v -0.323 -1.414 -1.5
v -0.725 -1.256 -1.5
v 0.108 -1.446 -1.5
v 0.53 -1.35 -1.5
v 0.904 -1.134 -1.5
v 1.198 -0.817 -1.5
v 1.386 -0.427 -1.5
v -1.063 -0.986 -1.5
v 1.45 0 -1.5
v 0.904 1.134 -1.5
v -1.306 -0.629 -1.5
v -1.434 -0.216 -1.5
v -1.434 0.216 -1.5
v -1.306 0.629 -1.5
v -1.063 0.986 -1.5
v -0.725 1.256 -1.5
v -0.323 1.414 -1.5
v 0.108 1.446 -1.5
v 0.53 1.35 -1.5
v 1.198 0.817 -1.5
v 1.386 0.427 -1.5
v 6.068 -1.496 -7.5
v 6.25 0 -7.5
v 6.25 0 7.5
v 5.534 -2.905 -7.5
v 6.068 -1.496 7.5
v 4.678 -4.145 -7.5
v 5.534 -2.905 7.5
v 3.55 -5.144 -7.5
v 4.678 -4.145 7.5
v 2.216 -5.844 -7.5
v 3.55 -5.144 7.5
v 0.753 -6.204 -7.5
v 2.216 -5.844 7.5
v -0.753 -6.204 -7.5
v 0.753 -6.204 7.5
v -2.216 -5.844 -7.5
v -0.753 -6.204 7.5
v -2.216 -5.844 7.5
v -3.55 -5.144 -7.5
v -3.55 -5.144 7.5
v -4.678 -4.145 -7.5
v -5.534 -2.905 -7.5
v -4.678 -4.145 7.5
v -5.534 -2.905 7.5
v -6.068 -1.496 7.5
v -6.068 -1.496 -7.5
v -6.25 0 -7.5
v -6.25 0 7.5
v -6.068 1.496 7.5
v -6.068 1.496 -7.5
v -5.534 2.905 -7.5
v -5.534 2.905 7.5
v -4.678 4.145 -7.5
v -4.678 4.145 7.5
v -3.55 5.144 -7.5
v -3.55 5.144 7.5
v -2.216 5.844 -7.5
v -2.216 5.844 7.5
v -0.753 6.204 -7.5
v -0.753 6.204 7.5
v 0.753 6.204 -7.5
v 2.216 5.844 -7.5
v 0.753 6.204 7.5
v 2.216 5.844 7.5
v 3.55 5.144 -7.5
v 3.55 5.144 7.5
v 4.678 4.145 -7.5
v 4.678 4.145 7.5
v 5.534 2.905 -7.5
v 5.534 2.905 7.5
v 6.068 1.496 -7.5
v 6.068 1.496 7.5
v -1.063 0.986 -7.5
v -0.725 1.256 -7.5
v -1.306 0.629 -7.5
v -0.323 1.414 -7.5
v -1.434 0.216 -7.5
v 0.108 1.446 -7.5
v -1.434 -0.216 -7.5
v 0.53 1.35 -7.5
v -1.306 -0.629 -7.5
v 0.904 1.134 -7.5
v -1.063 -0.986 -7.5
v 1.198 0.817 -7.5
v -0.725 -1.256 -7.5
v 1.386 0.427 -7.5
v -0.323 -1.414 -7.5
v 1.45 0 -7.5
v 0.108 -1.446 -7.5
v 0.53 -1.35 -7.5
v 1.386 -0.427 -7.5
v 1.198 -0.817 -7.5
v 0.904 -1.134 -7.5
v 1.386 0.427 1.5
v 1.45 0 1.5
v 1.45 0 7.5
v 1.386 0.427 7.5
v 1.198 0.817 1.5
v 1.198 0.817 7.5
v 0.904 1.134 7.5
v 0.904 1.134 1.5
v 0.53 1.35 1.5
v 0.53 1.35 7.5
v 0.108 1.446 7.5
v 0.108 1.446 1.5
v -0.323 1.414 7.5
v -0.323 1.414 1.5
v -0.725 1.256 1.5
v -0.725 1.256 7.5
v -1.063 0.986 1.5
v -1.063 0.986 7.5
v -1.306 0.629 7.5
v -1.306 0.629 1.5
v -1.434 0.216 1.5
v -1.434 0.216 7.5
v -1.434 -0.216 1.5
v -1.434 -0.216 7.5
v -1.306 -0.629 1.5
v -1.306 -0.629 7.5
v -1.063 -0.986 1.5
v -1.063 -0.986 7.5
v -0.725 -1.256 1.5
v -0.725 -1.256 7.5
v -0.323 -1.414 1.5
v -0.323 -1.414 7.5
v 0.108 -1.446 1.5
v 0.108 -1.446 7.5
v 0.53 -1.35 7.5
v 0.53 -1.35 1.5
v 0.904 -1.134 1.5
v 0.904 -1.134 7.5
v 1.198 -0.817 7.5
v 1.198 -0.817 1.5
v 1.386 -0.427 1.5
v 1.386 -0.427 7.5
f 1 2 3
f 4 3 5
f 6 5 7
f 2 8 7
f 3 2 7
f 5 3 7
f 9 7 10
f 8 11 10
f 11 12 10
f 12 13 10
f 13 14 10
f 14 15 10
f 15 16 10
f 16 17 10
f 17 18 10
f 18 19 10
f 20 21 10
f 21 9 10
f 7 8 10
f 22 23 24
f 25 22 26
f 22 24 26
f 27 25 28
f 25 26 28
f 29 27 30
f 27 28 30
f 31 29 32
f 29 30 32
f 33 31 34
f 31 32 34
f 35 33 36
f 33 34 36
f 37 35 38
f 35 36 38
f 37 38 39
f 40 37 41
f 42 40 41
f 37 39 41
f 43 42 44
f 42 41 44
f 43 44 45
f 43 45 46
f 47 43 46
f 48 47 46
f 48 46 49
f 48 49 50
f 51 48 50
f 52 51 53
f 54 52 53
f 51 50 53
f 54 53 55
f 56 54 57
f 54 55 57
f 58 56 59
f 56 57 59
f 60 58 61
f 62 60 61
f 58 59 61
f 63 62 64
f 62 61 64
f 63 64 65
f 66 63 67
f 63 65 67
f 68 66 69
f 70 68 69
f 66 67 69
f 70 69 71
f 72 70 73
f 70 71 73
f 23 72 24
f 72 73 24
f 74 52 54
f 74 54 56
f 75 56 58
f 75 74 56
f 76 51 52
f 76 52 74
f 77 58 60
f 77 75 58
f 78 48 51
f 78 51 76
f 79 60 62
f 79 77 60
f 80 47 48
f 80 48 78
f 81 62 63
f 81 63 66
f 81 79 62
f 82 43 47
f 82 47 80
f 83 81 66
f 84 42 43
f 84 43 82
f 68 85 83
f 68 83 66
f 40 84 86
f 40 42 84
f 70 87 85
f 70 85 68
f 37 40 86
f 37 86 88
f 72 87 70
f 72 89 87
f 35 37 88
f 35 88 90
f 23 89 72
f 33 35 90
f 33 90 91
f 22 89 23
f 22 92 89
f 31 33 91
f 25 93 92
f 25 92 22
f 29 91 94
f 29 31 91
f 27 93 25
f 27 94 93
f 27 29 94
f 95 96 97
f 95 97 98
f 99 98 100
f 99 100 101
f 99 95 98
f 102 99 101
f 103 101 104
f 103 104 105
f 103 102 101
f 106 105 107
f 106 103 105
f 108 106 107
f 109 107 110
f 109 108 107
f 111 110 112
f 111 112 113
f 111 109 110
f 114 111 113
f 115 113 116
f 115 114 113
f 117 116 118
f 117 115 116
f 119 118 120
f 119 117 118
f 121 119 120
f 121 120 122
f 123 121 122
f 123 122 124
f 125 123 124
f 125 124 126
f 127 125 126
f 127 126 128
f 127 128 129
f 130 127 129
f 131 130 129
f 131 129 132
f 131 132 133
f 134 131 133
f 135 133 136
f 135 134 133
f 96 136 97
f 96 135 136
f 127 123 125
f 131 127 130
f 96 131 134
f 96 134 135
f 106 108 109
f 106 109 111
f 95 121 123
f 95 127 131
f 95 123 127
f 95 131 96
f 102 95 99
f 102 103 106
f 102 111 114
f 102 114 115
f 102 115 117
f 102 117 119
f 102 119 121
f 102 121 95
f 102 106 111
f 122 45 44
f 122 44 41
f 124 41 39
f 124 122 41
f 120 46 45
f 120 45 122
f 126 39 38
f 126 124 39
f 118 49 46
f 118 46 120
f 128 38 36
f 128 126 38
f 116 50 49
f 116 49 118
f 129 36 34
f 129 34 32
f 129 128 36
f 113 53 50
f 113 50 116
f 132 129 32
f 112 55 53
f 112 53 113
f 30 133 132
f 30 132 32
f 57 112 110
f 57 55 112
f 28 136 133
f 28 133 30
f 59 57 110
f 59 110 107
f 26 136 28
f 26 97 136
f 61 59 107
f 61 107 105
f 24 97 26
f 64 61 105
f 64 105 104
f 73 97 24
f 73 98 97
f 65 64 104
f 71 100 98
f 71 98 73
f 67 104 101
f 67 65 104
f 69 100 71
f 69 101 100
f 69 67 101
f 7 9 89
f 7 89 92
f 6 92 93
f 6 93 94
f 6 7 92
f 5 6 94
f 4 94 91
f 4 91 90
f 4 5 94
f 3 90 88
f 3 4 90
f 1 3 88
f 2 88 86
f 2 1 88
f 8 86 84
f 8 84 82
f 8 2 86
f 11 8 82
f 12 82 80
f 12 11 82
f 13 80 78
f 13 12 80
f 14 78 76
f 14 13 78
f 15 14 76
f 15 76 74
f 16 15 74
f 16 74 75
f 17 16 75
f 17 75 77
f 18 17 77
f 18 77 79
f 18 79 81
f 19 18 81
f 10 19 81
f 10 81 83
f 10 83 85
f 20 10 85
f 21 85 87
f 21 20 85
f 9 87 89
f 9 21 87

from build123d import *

# Parameters (mm, degrees)
F0_R          = 6.25
F1_DEPTH      = 1.5
F1_DEPTH_BACK = 1.5
F2_R          = 6.25
F2_R_2        = 1.45
F3_DEPTH      = 6
F4_R          = 6.25
F4_R_2        = 1.45
F5_DEPTH      = 6


with BuildPart() as f1:
    # F0 (on Top) → F1 (new body, two sides)
    with BuildSketch(Plane.XY) as f1_sk:
        Circle(F0_R)
    extrude(amount=F1_DEPTH)
    extrude(f1_sk.sketch, amount=-F1_DEPTH_BACK)

    # F2 (on face) → F3 (join)
    with BuildSketch(Plane.XY.offset(1.5)):
        Circle(F2_R)
        Circle(F2_R_2, mode=Mode.SUBTRACT)
    extrude(amount=F3_DEPTH)

    # F4 (on face) → F5 (join)
    with BuildSketch(Plane(origin=(0, 0, -1.5), x_dir=(1, 0, 0), z_dir=(0, 0, -1))):
        Circle(F4_R)
        Circle(F4_R_2, mode=Mode.SUBTRACT)
    extrude(amount=F5_DEPTH)


solid = f1.part
